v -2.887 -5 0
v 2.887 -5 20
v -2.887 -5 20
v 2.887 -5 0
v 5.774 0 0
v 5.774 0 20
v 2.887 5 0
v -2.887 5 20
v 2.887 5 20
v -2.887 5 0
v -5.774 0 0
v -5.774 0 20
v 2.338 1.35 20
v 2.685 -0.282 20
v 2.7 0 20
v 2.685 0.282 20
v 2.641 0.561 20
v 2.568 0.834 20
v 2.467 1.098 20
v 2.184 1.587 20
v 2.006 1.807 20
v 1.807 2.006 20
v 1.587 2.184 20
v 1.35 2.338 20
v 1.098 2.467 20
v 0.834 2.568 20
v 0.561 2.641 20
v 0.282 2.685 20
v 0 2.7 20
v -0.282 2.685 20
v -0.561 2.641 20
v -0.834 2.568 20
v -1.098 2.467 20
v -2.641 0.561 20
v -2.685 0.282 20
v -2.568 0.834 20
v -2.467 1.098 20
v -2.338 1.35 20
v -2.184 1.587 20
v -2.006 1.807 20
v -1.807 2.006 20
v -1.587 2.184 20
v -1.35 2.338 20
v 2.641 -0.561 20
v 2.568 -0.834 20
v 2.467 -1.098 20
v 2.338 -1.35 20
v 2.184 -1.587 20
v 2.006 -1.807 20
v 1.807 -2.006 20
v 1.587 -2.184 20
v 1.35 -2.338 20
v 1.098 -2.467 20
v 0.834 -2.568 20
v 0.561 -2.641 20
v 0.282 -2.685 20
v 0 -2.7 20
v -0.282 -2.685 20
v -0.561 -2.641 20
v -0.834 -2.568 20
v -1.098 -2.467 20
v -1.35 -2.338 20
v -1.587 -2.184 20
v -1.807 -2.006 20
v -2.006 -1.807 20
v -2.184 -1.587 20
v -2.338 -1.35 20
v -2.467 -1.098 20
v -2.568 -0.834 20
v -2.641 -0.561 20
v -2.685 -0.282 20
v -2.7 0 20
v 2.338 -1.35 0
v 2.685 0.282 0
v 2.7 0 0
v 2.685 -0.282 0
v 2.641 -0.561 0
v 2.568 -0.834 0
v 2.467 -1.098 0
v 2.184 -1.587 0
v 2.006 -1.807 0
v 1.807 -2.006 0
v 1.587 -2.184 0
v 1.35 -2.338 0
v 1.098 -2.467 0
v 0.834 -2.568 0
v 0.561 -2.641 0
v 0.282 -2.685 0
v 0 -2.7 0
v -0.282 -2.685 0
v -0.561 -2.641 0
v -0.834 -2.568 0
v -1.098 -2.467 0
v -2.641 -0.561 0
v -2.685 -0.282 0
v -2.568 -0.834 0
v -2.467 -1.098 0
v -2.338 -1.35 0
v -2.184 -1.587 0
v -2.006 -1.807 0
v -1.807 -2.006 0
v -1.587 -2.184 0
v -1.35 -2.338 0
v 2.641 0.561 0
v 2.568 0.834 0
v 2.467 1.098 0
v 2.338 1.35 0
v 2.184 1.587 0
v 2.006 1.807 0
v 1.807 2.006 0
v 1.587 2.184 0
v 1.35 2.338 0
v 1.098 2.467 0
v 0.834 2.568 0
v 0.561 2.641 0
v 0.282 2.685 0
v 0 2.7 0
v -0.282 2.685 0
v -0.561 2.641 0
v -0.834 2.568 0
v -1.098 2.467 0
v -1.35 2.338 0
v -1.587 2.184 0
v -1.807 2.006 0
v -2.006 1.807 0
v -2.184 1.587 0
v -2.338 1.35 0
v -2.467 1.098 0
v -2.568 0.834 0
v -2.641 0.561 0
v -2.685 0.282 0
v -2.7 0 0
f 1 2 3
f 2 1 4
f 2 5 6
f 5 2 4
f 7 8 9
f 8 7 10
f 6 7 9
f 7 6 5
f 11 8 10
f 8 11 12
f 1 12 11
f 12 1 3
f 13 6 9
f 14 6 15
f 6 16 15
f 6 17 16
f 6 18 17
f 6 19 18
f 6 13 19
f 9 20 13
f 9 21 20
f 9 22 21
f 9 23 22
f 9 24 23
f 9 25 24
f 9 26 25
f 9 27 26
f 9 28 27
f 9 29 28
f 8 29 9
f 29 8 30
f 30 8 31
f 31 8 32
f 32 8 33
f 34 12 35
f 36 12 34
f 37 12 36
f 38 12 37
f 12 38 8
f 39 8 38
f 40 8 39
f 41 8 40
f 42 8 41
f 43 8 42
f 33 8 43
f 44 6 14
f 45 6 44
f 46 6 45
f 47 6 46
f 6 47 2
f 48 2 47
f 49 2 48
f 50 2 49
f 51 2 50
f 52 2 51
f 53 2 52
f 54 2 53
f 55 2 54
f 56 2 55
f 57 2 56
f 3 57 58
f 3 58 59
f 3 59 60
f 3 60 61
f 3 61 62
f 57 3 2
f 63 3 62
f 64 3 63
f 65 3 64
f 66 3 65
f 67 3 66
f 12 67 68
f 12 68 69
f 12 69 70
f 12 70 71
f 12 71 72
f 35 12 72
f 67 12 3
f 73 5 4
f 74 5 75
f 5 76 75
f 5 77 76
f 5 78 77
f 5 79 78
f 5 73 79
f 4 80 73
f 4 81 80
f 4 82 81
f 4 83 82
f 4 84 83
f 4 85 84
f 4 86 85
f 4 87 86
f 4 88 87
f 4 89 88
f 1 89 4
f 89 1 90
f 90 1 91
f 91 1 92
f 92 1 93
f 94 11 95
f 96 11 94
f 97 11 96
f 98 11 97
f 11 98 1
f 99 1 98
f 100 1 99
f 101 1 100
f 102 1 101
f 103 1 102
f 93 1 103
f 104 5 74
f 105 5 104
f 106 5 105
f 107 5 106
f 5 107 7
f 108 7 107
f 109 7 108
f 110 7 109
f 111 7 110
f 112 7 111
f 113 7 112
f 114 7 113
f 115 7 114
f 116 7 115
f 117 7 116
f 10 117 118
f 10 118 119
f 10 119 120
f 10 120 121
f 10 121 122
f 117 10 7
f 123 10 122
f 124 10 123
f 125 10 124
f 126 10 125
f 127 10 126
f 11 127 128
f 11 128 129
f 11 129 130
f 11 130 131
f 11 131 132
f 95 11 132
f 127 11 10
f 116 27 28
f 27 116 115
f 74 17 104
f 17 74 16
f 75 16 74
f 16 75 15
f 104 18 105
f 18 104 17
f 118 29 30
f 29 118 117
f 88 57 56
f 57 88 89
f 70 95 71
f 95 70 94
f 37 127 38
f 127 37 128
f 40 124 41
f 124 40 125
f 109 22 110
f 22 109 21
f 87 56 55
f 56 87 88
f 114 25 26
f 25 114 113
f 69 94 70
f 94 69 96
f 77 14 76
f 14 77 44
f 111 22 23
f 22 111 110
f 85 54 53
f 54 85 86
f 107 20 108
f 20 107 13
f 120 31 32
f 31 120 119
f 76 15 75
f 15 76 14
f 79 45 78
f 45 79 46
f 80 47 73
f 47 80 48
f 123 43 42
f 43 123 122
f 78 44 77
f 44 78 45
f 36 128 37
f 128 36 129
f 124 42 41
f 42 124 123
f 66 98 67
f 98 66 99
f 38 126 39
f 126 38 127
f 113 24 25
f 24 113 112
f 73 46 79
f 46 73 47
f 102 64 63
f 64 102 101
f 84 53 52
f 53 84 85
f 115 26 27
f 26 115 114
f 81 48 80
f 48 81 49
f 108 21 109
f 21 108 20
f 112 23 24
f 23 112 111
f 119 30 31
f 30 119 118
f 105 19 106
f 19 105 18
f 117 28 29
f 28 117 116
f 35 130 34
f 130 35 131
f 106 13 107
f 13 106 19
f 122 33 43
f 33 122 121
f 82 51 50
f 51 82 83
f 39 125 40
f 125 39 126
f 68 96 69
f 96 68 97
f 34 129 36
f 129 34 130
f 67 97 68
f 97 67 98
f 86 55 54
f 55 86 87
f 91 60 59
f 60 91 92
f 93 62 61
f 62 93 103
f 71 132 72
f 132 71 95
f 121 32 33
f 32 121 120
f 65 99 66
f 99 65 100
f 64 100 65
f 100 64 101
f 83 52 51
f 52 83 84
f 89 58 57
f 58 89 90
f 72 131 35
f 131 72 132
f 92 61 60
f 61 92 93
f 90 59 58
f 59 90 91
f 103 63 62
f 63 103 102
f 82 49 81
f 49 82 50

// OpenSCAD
// M5 standoff 20 mm: hex-bodied through standoff.
$fn = 60;
eps = 0.02;
thread_clearance_d = 5.4;
outer_flat = 10;
length = 20;
chamfer = 1.2;

difference() {
    union() {
        cylinder(d = outer_flat / cos(30), h = length, $fn = 6);
        cylinder(d1 = outer_flat / cos(30) - 2 * chamfer, d2 = outer_flat / cos(30), h = chamfer, $fn = 6);
        translate([0, 0, length - chamfer])
            cylinder(d1 = outer_flat / cos(30), d2 = outer_flat / cos(30) - 2 * chamfer, h = chamfer, $fn = 6);
    }
    translate([0, 0, -eps]) cylinder(d = thread_clearance_d, h = length + 2 * eps);
}
